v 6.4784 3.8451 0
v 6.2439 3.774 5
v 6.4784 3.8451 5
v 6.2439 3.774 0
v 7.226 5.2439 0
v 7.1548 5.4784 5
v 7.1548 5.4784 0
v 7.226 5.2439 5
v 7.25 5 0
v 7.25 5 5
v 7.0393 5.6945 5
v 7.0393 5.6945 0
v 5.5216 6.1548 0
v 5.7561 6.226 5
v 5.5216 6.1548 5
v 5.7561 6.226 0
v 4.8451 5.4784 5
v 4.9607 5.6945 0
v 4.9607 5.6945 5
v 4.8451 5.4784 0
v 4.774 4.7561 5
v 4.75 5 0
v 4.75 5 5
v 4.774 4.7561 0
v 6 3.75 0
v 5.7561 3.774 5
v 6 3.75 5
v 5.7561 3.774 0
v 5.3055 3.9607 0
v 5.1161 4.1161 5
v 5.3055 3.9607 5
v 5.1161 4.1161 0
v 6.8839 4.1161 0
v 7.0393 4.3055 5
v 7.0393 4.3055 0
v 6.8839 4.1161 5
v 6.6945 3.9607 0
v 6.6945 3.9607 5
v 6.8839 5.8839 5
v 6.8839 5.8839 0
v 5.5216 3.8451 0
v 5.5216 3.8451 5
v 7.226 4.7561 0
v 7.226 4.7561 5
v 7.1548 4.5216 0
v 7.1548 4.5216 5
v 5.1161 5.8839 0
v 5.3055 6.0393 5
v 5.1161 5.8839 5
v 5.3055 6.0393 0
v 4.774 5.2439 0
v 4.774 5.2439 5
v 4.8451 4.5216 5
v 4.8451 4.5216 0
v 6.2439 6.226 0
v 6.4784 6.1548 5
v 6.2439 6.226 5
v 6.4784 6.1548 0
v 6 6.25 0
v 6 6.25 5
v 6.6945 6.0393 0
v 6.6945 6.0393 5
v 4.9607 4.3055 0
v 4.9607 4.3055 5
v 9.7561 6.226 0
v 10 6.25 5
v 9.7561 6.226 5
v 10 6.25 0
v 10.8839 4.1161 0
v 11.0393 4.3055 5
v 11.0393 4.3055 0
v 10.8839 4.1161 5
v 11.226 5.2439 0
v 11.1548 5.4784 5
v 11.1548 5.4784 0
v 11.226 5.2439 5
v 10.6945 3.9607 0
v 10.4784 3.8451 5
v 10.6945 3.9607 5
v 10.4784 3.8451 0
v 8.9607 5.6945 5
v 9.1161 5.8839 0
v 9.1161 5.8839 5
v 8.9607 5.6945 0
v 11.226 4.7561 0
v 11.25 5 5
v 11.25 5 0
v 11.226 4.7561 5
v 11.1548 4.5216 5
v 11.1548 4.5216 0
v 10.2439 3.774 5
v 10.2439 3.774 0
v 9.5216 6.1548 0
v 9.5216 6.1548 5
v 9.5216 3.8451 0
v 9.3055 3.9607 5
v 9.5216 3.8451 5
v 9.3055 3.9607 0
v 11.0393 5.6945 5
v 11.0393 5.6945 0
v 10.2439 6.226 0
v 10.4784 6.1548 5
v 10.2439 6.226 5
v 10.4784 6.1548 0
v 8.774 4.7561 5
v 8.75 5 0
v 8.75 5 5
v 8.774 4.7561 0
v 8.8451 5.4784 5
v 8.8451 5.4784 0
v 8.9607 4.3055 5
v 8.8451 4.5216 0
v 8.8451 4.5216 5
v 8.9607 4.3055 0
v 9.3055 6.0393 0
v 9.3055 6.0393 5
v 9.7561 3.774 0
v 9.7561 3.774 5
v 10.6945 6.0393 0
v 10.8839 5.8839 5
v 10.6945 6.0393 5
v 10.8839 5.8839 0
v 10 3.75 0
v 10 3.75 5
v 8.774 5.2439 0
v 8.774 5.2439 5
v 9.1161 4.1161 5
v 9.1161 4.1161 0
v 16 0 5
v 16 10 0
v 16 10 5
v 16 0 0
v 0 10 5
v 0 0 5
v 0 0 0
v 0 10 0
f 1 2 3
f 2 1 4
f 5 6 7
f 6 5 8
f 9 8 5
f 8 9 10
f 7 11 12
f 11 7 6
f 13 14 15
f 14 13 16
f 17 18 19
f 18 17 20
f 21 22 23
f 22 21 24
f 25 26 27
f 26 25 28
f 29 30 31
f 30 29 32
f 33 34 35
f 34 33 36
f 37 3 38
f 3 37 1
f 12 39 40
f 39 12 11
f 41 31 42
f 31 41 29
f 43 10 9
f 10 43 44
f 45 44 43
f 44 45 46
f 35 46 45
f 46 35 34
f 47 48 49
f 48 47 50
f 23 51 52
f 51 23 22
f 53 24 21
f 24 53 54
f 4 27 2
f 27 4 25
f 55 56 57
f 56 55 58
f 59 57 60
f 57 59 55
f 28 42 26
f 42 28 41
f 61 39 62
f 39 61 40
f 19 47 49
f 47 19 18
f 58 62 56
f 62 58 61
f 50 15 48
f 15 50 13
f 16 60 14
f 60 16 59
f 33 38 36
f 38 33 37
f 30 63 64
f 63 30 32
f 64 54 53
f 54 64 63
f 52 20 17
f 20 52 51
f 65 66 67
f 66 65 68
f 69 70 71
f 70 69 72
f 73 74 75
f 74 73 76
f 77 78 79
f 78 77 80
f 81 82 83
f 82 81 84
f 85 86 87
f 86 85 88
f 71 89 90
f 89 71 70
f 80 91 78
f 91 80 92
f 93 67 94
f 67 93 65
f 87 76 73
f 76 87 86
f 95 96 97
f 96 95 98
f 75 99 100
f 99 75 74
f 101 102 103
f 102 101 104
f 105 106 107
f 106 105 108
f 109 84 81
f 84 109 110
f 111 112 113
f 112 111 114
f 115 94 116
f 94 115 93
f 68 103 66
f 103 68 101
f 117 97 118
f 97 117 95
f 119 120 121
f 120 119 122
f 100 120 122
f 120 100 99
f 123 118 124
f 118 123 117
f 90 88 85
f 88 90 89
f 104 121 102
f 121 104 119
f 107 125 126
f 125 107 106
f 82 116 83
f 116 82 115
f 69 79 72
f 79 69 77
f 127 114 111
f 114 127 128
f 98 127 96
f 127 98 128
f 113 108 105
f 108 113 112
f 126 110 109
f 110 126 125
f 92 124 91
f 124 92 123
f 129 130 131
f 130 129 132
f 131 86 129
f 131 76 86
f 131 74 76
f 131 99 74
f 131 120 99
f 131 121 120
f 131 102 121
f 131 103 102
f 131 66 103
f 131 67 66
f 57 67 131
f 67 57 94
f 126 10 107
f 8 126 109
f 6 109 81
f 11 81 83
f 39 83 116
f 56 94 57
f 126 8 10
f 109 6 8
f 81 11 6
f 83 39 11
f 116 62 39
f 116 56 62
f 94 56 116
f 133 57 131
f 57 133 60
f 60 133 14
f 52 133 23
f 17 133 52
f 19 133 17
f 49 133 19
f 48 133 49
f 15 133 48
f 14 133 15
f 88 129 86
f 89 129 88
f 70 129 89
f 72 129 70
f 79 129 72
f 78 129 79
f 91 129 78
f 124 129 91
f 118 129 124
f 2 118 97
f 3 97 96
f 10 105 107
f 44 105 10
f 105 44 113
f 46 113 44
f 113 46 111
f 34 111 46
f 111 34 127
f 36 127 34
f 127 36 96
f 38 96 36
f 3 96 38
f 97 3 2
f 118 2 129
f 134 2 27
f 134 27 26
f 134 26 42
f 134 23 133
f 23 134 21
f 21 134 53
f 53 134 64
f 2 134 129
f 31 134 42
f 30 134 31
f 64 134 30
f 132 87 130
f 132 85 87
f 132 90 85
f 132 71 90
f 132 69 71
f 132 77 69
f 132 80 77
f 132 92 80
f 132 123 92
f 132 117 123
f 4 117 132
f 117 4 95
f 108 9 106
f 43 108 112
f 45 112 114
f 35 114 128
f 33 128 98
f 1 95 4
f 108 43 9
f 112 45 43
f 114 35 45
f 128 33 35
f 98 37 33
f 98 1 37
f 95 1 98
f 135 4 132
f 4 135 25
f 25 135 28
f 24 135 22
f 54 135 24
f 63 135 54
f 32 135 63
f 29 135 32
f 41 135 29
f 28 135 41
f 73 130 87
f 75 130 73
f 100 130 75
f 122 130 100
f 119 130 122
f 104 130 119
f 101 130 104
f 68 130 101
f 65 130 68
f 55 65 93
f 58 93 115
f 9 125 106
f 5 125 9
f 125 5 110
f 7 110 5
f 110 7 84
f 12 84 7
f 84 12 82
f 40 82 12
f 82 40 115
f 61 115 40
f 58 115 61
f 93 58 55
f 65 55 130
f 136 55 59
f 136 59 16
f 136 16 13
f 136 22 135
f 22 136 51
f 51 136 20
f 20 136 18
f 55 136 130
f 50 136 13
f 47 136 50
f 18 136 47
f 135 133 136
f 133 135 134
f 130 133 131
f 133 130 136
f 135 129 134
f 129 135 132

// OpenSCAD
$fn = 32;

// ----------------------------------------------------------------------
// Micro pad: two-hole pad, 5-20 mm class
// ----------------------------------------------------------------------

// --- parameters (mm) ---
pad_l = 16;               // pad length, X
pad_w = 10;               // pad width, Y
pad_t = 5;                // pad thickness, Z
hole_d = 2.5;             // hole diameter
hole_x = 6;               // X of the first hole centre
fit_tol = 0.02;           // tolerance for press fits, mm
free_tol = 0.2;           // tolerance for clearance fits, mm

difference() {
  cube([pad_l, pad_w, pad_t]);
  for (x = [hole_x, pad_l - hole_x])
    translate([x, pad_w / 2, -1])
      cylinder(h = pad_t + 2, d = hole_d);
}
